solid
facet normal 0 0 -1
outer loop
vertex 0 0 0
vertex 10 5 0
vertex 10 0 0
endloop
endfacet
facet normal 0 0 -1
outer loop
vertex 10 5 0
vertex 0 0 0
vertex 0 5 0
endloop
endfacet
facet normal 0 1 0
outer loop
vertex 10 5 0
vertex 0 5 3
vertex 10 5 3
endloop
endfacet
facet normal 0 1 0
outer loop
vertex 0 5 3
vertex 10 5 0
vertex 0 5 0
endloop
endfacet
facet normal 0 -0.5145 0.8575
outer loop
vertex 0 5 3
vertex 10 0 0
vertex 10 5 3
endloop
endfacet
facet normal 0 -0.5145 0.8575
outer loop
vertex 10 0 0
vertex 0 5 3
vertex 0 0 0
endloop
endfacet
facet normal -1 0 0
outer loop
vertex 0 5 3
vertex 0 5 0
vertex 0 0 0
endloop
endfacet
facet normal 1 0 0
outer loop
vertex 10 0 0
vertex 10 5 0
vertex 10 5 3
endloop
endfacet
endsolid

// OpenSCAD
module prism(l, w, h){
       polyhedron(
               points=[[0,0,0], [l,0,0], [l,w,0], [0,w,0], [0,w,h], [l,w,h]],
               faces=[[0,1,2,3],[5,4,3,2],[0,4,5,1],[0,3,4],[5,2,1]]
               );
       
       // preview unfolded (do no
       }
   
   prism(10, 5, 3);
